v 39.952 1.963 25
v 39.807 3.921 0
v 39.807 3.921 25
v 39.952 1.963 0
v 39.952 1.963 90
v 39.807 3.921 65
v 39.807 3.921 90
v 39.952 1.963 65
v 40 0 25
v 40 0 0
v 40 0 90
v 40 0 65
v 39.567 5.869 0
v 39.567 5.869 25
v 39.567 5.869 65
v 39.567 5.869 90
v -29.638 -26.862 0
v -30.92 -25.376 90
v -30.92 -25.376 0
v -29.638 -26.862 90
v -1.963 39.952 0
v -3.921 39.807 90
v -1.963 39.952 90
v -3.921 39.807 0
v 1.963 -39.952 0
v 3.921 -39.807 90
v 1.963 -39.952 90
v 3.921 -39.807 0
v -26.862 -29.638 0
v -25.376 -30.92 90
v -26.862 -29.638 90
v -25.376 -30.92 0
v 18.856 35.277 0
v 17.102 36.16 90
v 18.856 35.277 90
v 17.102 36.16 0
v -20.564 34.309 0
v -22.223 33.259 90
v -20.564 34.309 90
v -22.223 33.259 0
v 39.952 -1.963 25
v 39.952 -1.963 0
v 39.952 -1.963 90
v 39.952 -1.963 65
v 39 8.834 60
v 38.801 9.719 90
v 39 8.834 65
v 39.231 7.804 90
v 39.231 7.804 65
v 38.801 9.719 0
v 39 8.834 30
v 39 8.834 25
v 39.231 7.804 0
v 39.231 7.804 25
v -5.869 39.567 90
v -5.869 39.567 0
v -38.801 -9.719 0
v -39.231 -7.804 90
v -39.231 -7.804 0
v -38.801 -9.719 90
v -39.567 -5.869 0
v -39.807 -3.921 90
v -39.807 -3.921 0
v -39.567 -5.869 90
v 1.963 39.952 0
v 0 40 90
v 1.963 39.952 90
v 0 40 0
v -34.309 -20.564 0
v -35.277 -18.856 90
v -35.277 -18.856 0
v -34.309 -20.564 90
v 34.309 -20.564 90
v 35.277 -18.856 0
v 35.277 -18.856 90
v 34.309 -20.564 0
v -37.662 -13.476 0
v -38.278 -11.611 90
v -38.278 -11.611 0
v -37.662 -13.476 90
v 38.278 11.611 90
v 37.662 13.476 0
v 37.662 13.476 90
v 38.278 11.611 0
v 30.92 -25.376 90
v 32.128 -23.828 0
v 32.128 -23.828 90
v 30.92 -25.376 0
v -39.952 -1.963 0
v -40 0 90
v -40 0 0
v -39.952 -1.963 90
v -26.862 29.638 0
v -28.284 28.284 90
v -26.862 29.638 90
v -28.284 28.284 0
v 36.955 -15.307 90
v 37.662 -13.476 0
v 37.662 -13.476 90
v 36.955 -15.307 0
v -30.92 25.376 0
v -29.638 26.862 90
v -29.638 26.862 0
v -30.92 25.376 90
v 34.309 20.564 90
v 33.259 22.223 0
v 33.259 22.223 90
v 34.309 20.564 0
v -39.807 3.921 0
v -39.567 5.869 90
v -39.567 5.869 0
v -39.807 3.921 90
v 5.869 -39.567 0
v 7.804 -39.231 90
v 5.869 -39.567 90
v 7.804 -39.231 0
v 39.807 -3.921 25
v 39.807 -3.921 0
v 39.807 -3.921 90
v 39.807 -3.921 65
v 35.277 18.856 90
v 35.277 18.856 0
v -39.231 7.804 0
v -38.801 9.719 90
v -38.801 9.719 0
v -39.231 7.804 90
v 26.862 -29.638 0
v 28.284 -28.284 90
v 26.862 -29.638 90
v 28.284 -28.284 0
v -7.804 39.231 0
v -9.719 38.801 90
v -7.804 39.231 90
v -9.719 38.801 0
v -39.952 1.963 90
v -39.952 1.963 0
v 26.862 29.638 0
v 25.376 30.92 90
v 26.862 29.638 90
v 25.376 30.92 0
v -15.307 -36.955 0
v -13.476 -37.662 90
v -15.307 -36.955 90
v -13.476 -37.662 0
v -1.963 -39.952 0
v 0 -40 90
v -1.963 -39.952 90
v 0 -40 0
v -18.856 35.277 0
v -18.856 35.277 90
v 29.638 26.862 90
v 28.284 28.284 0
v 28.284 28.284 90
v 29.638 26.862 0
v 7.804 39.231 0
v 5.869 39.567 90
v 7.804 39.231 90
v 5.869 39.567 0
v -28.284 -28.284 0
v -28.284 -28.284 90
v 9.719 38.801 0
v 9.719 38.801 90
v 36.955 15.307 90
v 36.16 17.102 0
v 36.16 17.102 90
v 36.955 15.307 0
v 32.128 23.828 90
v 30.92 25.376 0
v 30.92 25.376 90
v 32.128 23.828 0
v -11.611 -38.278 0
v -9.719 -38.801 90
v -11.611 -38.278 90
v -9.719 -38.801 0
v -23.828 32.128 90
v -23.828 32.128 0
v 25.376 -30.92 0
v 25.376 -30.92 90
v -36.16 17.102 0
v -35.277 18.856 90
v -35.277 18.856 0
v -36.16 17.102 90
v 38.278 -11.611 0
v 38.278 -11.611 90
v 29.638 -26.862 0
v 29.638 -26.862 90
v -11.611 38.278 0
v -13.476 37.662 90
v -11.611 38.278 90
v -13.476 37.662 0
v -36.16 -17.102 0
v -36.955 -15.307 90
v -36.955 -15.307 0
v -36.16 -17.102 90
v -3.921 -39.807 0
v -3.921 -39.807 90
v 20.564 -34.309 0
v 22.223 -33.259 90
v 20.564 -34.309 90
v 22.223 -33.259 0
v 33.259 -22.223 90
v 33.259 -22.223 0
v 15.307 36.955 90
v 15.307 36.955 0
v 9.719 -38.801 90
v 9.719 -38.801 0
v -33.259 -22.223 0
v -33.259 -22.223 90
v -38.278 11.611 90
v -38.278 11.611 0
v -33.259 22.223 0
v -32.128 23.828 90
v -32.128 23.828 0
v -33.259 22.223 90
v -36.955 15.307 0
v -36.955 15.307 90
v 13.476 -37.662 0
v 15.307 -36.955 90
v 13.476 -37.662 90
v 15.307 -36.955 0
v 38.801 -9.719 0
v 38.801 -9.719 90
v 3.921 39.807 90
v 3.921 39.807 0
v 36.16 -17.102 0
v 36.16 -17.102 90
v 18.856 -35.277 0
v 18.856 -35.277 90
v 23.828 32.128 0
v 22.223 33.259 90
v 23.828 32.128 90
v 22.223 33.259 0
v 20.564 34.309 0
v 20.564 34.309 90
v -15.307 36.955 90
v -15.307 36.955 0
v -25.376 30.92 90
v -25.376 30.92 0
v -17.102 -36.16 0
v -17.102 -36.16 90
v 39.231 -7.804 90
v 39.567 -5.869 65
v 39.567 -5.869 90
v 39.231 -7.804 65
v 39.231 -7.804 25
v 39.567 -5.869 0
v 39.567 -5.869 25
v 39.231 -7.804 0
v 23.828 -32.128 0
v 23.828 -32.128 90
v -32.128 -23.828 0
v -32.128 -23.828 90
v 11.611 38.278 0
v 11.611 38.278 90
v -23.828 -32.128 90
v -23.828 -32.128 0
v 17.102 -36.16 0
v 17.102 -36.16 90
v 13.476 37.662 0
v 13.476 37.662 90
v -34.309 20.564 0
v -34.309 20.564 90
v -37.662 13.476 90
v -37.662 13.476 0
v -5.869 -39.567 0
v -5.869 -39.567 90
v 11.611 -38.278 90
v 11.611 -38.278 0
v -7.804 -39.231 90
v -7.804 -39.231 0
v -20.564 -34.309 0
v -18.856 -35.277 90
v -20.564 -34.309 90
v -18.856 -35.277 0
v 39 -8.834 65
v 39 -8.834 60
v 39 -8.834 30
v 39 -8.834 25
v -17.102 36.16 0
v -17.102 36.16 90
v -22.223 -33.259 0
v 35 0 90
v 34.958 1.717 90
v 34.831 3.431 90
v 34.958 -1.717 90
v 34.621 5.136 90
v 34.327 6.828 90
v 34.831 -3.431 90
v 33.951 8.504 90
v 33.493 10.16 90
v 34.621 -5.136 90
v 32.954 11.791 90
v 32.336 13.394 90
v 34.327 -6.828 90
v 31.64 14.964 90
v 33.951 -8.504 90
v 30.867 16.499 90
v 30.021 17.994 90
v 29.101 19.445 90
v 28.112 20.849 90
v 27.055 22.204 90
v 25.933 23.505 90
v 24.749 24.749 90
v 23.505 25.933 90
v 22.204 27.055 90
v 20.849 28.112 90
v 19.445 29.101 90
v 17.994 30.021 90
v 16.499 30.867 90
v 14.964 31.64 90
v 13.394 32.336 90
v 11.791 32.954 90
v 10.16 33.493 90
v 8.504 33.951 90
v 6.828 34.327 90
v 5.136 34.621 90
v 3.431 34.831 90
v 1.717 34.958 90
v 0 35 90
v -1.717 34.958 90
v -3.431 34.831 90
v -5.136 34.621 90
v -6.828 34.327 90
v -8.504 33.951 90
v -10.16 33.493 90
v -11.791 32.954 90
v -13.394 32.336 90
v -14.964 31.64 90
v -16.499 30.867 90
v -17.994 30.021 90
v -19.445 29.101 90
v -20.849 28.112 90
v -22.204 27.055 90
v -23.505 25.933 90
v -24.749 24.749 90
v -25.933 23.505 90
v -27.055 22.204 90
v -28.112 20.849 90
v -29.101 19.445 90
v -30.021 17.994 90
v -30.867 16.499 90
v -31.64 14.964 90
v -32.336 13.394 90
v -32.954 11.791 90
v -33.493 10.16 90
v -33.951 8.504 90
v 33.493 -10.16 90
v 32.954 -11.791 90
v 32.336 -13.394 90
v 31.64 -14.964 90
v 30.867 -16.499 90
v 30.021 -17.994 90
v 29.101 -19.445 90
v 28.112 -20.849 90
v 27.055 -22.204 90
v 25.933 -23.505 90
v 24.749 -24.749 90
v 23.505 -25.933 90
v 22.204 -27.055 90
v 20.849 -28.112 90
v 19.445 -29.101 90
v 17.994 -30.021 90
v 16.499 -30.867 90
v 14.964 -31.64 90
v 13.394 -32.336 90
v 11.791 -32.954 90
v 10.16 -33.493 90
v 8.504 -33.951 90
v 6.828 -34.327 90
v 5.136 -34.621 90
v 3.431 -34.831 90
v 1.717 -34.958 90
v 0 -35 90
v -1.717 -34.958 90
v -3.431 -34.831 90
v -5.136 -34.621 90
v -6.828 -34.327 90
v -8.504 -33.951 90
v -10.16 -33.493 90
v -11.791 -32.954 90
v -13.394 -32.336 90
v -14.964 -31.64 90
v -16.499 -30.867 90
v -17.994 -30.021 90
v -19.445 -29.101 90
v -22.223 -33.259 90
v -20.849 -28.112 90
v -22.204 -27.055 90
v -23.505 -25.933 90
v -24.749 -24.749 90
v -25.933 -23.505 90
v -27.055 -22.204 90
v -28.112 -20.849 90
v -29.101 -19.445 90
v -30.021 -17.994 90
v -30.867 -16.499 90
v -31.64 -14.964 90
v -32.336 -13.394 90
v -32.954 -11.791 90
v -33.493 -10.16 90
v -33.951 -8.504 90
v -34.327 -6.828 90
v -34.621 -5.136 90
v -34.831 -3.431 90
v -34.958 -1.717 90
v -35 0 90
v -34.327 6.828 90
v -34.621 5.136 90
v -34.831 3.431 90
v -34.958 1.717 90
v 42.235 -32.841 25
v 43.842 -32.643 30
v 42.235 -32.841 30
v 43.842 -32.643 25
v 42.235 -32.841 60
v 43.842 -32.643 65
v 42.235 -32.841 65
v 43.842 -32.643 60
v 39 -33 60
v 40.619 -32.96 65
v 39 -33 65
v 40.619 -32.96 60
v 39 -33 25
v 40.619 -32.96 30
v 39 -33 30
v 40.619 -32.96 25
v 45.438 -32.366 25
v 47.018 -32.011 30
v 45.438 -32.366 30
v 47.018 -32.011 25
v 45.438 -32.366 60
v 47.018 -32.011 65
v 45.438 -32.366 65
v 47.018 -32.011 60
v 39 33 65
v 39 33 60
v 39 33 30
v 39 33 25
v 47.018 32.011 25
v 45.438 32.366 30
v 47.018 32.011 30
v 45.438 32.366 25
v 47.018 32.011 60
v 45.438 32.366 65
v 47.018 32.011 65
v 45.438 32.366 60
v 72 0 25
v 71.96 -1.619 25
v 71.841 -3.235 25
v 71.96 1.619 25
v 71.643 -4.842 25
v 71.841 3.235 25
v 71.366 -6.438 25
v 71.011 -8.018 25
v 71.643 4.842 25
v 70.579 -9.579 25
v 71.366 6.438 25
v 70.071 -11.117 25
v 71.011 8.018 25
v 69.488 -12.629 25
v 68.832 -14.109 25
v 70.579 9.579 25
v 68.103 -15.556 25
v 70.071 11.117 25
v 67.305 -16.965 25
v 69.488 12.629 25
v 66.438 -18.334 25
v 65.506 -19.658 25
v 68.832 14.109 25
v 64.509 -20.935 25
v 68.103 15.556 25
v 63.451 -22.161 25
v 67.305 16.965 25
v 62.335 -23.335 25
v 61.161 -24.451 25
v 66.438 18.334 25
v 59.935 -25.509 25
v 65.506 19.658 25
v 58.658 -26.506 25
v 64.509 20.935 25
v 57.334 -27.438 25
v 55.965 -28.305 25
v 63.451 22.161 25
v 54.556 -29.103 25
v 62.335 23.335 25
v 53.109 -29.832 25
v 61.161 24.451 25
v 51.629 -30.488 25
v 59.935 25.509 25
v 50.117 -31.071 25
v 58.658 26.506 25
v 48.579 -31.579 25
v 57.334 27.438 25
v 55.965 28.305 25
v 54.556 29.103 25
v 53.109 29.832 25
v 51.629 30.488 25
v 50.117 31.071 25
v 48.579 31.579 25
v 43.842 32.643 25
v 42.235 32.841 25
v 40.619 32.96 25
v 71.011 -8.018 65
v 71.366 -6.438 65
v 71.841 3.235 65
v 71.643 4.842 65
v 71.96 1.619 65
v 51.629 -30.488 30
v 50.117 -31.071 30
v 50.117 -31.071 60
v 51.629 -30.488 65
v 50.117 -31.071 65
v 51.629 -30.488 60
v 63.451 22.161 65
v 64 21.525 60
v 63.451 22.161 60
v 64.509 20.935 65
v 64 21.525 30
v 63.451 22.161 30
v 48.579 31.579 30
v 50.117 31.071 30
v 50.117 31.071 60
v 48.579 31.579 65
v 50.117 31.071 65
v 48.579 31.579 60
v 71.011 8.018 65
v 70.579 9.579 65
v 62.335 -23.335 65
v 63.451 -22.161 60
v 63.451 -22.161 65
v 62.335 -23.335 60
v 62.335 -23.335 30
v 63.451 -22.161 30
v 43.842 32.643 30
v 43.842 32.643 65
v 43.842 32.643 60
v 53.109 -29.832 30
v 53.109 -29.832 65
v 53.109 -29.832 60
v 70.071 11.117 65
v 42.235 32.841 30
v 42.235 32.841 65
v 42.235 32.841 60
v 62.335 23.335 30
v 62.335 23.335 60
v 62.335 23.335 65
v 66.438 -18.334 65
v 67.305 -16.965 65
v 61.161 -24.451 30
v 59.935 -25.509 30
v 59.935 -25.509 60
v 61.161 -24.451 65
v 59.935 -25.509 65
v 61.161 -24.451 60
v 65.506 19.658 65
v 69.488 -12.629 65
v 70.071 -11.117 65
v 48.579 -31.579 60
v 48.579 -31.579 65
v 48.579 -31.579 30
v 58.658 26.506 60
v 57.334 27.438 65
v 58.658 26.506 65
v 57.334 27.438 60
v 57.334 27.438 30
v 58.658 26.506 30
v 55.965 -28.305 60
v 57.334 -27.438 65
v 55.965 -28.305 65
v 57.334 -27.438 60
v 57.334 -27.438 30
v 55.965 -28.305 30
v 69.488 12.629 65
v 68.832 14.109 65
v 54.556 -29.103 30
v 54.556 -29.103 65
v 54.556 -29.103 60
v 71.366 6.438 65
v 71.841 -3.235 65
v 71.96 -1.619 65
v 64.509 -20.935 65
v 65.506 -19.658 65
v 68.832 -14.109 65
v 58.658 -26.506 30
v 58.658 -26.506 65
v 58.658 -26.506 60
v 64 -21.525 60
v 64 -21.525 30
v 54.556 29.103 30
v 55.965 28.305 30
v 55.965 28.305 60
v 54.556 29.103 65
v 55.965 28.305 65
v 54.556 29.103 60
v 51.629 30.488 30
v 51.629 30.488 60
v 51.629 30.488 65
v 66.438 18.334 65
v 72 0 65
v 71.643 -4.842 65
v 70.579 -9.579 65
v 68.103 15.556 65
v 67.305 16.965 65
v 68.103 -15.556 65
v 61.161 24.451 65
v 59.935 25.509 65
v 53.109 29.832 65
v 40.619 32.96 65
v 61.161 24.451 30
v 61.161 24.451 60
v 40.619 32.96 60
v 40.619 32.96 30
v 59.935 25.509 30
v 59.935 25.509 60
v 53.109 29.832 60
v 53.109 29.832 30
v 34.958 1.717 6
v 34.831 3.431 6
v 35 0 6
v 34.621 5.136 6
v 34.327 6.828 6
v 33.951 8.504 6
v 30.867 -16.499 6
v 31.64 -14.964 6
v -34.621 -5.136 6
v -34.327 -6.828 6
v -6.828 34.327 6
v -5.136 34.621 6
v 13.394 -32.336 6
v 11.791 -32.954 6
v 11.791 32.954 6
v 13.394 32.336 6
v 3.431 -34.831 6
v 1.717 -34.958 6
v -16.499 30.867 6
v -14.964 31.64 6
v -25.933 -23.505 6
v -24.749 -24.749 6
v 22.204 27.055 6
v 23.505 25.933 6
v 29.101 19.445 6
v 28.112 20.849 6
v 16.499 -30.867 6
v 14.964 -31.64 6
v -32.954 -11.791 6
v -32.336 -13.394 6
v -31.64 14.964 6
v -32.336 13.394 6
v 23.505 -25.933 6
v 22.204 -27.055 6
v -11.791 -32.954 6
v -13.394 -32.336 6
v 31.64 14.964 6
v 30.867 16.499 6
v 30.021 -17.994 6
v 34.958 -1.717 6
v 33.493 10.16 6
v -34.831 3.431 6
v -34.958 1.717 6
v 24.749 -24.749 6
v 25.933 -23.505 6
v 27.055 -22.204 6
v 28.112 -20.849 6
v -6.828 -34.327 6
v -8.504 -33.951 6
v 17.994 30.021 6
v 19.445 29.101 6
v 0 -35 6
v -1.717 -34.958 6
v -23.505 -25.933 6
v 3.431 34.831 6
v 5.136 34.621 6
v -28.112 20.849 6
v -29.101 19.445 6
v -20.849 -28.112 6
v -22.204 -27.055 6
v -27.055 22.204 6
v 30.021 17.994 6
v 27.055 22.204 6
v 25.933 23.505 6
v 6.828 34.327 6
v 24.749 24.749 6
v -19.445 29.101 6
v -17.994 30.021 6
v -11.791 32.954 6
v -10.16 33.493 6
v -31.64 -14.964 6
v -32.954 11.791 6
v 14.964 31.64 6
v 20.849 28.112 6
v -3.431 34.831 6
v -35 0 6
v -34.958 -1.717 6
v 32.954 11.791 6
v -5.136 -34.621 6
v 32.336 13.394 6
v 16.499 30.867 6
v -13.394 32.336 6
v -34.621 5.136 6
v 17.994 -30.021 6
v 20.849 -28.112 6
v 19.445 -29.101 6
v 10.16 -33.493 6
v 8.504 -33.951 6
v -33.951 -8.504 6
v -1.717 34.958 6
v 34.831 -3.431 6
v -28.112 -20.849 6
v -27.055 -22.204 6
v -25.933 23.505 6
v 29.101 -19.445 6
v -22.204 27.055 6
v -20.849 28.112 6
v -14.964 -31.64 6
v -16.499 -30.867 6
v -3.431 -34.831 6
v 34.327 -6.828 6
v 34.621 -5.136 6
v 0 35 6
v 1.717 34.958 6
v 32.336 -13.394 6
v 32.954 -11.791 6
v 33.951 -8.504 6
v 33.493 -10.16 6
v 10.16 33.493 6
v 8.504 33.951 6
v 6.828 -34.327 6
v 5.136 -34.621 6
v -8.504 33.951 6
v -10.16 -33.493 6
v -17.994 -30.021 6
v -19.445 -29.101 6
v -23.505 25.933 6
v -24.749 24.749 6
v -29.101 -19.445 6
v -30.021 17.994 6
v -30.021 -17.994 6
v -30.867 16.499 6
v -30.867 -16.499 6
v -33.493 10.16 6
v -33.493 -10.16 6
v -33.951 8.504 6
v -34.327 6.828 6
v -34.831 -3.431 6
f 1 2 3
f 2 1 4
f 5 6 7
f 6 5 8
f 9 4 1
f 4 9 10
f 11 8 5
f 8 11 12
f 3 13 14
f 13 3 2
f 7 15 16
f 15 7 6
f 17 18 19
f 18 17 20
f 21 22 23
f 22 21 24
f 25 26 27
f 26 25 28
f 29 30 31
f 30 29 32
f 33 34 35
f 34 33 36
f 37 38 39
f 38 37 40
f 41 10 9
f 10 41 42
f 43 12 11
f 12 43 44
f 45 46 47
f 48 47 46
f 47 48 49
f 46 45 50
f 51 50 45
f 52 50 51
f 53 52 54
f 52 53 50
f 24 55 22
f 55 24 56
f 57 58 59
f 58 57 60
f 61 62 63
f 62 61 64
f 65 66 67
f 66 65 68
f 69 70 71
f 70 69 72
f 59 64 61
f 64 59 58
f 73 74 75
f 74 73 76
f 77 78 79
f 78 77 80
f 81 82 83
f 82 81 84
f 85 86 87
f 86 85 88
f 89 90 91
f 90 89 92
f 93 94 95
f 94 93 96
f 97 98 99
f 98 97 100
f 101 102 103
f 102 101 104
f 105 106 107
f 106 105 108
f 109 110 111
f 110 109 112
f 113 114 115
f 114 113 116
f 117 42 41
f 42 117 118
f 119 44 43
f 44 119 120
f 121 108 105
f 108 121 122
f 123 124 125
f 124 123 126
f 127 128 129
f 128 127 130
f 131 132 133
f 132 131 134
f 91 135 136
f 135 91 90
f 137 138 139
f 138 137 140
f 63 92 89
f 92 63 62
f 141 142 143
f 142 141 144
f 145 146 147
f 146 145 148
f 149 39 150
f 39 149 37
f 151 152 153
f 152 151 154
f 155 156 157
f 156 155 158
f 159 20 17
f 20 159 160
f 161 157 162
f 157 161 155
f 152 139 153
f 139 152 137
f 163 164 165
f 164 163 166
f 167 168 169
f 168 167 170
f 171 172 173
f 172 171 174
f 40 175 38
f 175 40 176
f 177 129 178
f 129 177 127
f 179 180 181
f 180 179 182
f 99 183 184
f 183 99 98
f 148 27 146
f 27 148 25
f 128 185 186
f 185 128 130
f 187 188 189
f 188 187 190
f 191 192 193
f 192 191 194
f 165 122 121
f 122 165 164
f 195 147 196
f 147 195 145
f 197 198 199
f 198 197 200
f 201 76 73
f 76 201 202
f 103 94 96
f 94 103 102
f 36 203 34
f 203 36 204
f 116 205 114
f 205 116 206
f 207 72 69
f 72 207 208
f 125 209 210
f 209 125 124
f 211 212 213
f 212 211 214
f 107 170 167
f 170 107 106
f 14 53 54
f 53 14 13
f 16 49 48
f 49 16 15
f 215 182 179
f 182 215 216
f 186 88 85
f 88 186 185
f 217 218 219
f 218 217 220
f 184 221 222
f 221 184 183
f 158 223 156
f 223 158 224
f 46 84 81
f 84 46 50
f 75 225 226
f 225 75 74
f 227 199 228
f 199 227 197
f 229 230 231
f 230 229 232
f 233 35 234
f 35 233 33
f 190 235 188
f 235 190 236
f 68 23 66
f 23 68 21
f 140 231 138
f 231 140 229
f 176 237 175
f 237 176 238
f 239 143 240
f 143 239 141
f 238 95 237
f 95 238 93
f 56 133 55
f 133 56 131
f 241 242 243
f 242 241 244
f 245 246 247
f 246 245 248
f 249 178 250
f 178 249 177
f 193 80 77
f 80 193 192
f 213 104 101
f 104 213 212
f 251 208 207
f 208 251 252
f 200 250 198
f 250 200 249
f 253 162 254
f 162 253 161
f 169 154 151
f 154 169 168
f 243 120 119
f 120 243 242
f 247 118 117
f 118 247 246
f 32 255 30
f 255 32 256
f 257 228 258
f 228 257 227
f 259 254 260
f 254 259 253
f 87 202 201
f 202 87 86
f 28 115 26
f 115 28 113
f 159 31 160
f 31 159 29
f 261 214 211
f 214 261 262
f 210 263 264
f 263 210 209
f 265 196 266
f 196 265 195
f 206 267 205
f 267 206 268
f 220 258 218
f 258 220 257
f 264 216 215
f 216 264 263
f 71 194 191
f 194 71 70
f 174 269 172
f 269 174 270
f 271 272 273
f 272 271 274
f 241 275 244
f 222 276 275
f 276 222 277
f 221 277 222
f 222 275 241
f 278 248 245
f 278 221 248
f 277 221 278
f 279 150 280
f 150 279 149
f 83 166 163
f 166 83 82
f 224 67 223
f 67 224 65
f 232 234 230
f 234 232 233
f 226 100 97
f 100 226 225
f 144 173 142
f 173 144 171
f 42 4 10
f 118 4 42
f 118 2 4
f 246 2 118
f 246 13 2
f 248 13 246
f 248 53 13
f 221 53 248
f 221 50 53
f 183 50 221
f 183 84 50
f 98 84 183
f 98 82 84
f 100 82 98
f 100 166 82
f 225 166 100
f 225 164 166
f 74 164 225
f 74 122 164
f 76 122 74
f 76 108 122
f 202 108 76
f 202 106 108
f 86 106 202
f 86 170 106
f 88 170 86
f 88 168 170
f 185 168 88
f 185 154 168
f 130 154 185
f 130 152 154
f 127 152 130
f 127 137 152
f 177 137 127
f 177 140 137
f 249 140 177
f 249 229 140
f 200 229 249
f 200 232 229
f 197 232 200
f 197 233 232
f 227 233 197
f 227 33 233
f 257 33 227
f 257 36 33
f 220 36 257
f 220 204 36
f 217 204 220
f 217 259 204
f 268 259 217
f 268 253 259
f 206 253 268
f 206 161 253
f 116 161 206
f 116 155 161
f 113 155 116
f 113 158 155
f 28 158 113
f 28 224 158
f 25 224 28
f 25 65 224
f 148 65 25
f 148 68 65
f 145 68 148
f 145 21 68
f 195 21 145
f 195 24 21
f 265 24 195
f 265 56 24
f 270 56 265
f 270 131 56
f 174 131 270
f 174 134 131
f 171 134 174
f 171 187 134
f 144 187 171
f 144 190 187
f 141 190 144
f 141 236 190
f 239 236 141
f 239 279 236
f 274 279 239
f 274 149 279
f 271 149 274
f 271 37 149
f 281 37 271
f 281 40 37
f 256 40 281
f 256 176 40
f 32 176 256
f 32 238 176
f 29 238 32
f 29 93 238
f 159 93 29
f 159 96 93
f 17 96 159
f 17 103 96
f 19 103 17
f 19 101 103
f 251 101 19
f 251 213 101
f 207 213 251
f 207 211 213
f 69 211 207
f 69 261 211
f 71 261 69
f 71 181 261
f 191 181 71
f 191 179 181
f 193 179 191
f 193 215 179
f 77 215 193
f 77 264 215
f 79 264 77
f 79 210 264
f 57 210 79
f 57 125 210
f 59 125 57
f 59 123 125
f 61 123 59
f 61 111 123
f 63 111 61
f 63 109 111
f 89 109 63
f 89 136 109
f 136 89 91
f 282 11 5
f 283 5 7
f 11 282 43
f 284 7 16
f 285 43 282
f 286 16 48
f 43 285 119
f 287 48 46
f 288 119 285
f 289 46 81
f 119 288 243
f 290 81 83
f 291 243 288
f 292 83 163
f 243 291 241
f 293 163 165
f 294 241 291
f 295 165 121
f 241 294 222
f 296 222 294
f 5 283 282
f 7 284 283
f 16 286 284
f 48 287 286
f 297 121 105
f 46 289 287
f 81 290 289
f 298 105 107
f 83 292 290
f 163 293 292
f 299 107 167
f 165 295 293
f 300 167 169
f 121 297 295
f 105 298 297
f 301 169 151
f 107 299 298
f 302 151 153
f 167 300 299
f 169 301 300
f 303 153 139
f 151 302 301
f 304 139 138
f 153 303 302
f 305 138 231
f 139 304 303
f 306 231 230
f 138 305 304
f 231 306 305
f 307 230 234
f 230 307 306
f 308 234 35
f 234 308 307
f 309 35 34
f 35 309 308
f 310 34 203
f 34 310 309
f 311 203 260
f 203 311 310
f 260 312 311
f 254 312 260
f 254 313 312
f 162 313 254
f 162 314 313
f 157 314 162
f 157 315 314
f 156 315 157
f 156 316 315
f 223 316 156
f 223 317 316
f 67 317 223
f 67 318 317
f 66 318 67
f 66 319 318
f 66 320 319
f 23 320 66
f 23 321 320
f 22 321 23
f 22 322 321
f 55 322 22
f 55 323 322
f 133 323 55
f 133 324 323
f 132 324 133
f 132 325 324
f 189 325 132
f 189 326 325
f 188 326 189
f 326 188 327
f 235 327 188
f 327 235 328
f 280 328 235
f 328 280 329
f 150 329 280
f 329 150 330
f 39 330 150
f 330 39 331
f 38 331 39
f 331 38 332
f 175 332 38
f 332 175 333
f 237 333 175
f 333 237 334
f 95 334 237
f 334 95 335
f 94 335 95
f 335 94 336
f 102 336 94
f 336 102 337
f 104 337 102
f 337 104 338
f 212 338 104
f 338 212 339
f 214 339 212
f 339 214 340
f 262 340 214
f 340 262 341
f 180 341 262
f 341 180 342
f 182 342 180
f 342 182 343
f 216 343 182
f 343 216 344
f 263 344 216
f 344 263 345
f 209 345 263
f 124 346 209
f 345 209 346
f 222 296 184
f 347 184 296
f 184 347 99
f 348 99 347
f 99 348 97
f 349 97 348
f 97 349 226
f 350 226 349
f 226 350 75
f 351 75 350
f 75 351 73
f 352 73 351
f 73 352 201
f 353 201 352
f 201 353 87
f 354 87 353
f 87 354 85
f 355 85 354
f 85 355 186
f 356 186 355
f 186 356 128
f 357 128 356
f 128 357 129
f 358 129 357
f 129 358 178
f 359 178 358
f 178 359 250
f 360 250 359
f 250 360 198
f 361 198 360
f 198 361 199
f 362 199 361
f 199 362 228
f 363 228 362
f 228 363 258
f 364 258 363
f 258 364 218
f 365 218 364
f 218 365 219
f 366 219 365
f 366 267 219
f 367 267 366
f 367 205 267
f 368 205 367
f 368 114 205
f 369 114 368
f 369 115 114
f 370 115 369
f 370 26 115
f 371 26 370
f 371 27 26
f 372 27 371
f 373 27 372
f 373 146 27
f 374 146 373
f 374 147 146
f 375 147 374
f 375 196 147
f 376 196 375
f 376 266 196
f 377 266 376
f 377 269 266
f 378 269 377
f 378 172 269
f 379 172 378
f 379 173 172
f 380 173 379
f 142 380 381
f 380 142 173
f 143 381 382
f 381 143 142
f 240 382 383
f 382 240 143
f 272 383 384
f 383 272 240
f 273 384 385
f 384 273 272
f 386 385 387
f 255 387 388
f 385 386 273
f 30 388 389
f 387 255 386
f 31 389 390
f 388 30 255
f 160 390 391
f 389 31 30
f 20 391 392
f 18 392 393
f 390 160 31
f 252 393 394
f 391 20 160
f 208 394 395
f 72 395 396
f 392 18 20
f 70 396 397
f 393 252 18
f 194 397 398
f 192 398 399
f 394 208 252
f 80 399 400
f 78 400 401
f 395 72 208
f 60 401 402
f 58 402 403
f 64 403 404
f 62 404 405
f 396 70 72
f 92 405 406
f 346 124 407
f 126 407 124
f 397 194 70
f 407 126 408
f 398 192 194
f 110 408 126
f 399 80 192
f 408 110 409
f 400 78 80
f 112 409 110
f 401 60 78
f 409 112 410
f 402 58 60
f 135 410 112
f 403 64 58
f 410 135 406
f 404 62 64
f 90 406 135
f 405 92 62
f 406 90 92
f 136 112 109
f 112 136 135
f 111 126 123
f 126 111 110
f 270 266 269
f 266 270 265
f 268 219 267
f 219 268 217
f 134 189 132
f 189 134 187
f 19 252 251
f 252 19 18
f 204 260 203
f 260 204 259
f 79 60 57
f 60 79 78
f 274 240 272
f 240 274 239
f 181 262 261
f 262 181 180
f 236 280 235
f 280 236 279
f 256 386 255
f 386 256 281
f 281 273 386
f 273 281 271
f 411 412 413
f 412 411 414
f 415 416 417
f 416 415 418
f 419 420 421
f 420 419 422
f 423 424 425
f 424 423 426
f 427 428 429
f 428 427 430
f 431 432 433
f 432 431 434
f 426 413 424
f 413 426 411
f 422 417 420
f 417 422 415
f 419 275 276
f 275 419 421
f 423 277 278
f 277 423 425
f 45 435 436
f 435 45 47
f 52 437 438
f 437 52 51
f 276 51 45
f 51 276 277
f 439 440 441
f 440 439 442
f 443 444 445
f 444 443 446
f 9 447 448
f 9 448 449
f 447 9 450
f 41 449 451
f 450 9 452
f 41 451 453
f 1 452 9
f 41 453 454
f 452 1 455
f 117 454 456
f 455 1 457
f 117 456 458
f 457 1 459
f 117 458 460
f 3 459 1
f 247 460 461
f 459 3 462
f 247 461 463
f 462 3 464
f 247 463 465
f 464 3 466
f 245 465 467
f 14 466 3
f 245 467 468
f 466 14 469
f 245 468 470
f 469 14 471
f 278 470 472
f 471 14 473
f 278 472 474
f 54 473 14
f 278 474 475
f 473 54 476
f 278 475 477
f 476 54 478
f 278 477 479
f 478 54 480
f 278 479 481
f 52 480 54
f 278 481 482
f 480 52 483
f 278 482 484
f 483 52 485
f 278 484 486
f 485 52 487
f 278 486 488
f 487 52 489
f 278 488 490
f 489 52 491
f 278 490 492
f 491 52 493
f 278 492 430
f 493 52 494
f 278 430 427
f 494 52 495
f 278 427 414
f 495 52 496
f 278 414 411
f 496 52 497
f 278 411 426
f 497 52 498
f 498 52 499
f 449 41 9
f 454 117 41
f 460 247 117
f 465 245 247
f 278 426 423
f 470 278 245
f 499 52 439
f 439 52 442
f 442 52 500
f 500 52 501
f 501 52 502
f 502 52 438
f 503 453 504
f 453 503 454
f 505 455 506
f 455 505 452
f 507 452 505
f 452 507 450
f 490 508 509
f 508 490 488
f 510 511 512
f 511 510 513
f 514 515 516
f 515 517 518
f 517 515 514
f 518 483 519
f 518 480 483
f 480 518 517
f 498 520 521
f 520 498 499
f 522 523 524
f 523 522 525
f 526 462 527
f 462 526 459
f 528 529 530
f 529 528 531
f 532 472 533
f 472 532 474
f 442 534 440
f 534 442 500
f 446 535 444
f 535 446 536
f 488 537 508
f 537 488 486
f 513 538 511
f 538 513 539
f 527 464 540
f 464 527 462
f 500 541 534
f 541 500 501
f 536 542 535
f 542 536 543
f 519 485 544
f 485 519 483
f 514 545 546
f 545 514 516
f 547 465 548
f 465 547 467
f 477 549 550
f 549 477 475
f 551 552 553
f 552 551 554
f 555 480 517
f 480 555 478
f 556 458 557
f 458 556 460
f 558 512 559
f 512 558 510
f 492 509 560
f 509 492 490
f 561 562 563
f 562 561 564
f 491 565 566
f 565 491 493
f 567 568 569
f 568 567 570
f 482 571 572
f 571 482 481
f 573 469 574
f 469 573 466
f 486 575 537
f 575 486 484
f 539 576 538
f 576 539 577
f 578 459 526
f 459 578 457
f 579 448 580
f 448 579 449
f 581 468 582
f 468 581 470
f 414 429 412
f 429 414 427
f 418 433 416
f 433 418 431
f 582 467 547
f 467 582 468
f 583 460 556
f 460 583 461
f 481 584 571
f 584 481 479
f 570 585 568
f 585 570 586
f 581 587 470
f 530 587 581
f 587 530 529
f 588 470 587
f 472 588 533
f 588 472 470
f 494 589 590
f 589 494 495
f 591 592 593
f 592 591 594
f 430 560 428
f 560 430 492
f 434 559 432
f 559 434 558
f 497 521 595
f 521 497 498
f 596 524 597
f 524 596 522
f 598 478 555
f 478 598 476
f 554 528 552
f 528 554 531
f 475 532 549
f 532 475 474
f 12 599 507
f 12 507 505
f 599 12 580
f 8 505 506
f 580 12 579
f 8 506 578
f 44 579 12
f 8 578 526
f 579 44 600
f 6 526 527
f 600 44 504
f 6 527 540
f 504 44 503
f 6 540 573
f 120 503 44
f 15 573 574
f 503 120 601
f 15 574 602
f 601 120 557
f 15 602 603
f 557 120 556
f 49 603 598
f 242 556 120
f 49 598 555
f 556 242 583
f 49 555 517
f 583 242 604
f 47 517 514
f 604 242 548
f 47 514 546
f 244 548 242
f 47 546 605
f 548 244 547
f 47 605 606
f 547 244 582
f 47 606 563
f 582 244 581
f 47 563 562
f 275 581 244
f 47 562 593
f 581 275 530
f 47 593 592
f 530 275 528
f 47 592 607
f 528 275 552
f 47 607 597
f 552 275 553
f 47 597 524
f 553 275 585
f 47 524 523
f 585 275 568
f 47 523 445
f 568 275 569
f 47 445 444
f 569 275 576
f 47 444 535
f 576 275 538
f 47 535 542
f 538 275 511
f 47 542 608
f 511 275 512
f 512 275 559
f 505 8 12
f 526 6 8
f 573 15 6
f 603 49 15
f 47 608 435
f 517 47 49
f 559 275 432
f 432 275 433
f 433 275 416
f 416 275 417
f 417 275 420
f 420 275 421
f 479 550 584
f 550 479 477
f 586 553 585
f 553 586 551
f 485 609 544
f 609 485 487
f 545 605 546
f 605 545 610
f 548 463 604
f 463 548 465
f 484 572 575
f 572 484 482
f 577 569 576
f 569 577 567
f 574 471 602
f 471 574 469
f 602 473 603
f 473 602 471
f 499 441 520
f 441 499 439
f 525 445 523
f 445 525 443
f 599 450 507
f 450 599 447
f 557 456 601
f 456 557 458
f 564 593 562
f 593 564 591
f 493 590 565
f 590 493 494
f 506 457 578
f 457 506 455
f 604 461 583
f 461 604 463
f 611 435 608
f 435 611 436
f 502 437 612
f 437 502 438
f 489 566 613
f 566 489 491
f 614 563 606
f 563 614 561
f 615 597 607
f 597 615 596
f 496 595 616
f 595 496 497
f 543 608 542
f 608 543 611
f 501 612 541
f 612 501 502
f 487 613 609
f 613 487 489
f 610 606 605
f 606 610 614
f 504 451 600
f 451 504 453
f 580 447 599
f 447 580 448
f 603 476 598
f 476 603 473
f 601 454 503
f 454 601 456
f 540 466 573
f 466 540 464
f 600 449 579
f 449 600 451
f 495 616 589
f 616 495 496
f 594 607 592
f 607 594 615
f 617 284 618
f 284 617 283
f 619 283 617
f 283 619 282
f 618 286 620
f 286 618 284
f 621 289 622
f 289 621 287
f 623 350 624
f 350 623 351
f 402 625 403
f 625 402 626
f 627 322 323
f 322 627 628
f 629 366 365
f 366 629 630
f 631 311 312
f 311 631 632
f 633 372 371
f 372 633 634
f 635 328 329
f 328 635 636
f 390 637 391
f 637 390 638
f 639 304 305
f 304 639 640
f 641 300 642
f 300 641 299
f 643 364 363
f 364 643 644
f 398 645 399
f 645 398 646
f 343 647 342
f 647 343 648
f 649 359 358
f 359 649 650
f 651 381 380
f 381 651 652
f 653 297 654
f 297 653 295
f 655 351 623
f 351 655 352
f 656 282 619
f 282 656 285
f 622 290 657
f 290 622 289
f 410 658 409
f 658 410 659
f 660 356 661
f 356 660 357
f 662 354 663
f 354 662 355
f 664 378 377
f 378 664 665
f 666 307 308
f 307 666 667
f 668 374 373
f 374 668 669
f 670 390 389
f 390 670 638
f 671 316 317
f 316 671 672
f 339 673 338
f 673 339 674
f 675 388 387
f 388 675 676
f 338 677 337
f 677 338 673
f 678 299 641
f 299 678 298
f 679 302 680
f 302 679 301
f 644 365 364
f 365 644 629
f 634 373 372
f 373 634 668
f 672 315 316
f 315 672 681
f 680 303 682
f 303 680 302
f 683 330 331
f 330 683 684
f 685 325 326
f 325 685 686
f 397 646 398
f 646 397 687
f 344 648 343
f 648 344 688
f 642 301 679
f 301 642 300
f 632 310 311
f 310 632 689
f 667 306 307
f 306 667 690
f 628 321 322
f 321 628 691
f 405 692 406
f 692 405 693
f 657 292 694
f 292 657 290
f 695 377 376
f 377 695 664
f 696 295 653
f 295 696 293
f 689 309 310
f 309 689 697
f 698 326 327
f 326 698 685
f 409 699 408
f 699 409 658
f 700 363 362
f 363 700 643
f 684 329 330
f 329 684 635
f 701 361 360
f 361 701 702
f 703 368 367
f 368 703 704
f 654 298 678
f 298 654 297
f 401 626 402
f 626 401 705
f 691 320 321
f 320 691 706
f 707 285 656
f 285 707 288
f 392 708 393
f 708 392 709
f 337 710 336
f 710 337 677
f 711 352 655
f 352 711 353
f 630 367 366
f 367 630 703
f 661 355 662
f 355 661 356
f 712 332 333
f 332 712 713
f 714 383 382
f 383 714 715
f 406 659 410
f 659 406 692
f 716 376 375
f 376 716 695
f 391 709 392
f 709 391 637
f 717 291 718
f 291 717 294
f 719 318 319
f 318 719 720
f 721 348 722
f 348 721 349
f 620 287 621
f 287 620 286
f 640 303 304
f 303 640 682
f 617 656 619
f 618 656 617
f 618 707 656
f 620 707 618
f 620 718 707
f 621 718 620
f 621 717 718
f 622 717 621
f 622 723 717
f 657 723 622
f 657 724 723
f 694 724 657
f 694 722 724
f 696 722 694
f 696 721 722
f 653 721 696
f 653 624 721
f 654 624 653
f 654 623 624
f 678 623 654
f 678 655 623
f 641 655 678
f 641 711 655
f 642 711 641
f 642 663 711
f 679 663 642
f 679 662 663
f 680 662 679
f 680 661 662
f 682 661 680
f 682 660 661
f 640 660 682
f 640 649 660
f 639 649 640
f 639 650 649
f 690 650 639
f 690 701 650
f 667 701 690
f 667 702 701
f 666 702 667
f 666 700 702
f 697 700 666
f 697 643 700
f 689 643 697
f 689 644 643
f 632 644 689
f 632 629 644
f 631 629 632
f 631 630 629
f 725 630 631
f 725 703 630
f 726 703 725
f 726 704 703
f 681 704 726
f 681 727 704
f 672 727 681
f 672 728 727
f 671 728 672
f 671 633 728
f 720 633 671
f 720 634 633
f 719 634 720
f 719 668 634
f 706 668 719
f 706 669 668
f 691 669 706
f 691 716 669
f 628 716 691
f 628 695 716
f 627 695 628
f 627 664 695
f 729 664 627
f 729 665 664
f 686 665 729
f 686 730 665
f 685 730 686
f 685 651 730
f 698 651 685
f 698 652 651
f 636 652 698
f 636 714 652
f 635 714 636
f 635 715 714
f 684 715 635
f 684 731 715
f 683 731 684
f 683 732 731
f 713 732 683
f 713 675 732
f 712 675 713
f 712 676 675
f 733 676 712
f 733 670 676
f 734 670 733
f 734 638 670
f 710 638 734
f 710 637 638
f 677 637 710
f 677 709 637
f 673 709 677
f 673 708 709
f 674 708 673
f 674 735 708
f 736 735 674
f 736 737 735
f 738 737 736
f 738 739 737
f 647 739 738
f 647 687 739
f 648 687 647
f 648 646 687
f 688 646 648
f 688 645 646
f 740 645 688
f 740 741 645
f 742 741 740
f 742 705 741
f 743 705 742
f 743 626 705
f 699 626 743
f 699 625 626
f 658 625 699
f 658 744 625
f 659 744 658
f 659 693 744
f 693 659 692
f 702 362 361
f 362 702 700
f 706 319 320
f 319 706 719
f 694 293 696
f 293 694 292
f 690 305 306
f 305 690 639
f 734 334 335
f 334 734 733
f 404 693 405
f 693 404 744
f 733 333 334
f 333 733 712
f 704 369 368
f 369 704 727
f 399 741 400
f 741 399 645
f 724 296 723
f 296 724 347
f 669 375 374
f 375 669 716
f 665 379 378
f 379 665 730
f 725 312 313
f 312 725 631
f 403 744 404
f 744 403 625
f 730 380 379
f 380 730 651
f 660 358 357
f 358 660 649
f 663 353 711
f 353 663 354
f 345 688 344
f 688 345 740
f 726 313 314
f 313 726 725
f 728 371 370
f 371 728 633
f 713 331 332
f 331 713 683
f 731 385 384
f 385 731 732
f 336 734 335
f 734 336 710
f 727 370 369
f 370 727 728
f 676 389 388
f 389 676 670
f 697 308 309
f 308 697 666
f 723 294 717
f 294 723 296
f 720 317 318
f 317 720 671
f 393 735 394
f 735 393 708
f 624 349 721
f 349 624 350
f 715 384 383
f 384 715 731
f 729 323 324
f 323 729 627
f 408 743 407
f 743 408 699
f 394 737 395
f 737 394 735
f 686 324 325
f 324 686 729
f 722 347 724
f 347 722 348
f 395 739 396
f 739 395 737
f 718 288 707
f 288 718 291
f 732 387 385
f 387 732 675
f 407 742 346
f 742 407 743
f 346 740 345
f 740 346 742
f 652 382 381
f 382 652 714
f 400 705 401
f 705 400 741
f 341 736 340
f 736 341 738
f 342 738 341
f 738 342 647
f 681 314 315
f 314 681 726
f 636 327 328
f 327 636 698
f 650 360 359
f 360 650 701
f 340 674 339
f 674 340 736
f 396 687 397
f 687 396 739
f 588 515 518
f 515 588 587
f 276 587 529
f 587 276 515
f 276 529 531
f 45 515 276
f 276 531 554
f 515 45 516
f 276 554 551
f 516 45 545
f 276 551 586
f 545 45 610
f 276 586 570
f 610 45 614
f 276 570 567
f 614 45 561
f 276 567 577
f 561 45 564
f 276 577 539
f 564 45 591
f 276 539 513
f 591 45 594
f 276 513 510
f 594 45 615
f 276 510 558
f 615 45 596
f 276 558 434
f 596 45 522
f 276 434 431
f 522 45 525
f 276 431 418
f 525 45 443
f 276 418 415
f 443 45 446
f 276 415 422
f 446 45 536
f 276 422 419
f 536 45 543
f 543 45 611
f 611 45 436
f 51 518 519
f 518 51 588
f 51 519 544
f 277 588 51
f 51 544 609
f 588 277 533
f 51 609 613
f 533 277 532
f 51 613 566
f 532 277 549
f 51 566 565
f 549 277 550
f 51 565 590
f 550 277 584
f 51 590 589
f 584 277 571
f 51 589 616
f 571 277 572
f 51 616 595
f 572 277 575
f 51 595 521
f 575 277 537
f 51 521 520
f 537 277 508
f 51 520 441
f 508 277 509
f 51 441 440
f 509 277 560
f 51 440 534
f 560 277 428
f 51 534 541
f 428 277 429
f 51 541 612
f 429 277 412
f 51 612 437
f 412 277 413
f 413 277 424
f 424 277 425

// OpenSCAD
$fn = 128;

// Mug parameters
outer_diam = 80;
inner_diam = 70;
outer_r = outer_diam / 2; // 40
inner_r = inner_diam / 2; // 35
mug_height = 90;
bottom_thickness = 6;

// Handle parameters
handle_overlap_into_mug = 1;        // mm overlap into mug outer wall to ensure solid union
handle_inner_width = 25;            // inner opening width (X direction)
handle_inner_height = 30;           // inner opening height (Z direction)
handle_wall_thickness = 8;          // radial thickness of the handle (from inner opening to outer semicircle)
handle_outer_radius = handle_inner_width + handle_wall_thickness; // semicircle outer radius
handle_center_x = outer_r - handle_overlap_into_mug; // X position of flat (D) face (inner flat sits at this x)
handle_extrude_height = 40;         // total vertical size of the handle solid (will be centered on mug mid-height)

// Derived
handle_half_y = handle_outer_radius + 1; // extra margin for 2D rectangle used in intersection

module handle_solid() {
    // Create a right-half (semi) circle (outer shape of the D) and extrude it vertically.
    // The semicircle is centered at (handle_center_x, 0) and only the right half is kept (flat at x = handle_center_x).
    h = handle_outer_radius;
    cx = handle_center_x;
    linear_extrude(height = handle_extrude_height, center = true) 
        intersection() {
            translate([cx, 0]) circle(r = h);
            // half-plane x >= cx implemented as a large rectangle
            polygon(points = [
                [cx, -h - 2],
                [cx + h + 2, -h - 2],
                [cx + h + 2,  h + 2],
                [cx,  h + 2]
            ]);
        }
}

module mug_with_handle() {
    // Build outer solid (mug outer cylinder + handle), then subtract inner cavity and the finger opening cutout.
    difference() {
        // Outer solid: mug outer + handle
        union() {
            // Mug outer cylinder
            translate([0, 0, 0])
                cylinder(r = outer_r, h = mug_height);
            // Handle solid, centered vertically on the mug
            translate([0, 0, mug_height / 2])
                handle_solid();
        }

        // Subtract inner cavity (to make the mug hollow), leaving the specified bottom thickness.
        translate([0, 0, bottom_thickness])
            cylinder(r = inner_r, h = mug_height - bottom_thickness);

        // Subtract the rectangular finger opening (width x height) from the handle.
        // Position: x from handle_center_x to handle_center_x + handle_inner_width (flat face at handle_center_x),
        // y covers the full semicircle extent, z centered at mug mid-height with specified inner height.
        translate([handle_center_x, -handle_half_y, (mug_height / 2) - (handle_inner_height / 2)])
            cube([handle_inner_width, 2 * handle_half_y, handle_inner_height], center = false);
    }
}

// Render the mug with handle (handle only on +X side)
mug_with_handle();
